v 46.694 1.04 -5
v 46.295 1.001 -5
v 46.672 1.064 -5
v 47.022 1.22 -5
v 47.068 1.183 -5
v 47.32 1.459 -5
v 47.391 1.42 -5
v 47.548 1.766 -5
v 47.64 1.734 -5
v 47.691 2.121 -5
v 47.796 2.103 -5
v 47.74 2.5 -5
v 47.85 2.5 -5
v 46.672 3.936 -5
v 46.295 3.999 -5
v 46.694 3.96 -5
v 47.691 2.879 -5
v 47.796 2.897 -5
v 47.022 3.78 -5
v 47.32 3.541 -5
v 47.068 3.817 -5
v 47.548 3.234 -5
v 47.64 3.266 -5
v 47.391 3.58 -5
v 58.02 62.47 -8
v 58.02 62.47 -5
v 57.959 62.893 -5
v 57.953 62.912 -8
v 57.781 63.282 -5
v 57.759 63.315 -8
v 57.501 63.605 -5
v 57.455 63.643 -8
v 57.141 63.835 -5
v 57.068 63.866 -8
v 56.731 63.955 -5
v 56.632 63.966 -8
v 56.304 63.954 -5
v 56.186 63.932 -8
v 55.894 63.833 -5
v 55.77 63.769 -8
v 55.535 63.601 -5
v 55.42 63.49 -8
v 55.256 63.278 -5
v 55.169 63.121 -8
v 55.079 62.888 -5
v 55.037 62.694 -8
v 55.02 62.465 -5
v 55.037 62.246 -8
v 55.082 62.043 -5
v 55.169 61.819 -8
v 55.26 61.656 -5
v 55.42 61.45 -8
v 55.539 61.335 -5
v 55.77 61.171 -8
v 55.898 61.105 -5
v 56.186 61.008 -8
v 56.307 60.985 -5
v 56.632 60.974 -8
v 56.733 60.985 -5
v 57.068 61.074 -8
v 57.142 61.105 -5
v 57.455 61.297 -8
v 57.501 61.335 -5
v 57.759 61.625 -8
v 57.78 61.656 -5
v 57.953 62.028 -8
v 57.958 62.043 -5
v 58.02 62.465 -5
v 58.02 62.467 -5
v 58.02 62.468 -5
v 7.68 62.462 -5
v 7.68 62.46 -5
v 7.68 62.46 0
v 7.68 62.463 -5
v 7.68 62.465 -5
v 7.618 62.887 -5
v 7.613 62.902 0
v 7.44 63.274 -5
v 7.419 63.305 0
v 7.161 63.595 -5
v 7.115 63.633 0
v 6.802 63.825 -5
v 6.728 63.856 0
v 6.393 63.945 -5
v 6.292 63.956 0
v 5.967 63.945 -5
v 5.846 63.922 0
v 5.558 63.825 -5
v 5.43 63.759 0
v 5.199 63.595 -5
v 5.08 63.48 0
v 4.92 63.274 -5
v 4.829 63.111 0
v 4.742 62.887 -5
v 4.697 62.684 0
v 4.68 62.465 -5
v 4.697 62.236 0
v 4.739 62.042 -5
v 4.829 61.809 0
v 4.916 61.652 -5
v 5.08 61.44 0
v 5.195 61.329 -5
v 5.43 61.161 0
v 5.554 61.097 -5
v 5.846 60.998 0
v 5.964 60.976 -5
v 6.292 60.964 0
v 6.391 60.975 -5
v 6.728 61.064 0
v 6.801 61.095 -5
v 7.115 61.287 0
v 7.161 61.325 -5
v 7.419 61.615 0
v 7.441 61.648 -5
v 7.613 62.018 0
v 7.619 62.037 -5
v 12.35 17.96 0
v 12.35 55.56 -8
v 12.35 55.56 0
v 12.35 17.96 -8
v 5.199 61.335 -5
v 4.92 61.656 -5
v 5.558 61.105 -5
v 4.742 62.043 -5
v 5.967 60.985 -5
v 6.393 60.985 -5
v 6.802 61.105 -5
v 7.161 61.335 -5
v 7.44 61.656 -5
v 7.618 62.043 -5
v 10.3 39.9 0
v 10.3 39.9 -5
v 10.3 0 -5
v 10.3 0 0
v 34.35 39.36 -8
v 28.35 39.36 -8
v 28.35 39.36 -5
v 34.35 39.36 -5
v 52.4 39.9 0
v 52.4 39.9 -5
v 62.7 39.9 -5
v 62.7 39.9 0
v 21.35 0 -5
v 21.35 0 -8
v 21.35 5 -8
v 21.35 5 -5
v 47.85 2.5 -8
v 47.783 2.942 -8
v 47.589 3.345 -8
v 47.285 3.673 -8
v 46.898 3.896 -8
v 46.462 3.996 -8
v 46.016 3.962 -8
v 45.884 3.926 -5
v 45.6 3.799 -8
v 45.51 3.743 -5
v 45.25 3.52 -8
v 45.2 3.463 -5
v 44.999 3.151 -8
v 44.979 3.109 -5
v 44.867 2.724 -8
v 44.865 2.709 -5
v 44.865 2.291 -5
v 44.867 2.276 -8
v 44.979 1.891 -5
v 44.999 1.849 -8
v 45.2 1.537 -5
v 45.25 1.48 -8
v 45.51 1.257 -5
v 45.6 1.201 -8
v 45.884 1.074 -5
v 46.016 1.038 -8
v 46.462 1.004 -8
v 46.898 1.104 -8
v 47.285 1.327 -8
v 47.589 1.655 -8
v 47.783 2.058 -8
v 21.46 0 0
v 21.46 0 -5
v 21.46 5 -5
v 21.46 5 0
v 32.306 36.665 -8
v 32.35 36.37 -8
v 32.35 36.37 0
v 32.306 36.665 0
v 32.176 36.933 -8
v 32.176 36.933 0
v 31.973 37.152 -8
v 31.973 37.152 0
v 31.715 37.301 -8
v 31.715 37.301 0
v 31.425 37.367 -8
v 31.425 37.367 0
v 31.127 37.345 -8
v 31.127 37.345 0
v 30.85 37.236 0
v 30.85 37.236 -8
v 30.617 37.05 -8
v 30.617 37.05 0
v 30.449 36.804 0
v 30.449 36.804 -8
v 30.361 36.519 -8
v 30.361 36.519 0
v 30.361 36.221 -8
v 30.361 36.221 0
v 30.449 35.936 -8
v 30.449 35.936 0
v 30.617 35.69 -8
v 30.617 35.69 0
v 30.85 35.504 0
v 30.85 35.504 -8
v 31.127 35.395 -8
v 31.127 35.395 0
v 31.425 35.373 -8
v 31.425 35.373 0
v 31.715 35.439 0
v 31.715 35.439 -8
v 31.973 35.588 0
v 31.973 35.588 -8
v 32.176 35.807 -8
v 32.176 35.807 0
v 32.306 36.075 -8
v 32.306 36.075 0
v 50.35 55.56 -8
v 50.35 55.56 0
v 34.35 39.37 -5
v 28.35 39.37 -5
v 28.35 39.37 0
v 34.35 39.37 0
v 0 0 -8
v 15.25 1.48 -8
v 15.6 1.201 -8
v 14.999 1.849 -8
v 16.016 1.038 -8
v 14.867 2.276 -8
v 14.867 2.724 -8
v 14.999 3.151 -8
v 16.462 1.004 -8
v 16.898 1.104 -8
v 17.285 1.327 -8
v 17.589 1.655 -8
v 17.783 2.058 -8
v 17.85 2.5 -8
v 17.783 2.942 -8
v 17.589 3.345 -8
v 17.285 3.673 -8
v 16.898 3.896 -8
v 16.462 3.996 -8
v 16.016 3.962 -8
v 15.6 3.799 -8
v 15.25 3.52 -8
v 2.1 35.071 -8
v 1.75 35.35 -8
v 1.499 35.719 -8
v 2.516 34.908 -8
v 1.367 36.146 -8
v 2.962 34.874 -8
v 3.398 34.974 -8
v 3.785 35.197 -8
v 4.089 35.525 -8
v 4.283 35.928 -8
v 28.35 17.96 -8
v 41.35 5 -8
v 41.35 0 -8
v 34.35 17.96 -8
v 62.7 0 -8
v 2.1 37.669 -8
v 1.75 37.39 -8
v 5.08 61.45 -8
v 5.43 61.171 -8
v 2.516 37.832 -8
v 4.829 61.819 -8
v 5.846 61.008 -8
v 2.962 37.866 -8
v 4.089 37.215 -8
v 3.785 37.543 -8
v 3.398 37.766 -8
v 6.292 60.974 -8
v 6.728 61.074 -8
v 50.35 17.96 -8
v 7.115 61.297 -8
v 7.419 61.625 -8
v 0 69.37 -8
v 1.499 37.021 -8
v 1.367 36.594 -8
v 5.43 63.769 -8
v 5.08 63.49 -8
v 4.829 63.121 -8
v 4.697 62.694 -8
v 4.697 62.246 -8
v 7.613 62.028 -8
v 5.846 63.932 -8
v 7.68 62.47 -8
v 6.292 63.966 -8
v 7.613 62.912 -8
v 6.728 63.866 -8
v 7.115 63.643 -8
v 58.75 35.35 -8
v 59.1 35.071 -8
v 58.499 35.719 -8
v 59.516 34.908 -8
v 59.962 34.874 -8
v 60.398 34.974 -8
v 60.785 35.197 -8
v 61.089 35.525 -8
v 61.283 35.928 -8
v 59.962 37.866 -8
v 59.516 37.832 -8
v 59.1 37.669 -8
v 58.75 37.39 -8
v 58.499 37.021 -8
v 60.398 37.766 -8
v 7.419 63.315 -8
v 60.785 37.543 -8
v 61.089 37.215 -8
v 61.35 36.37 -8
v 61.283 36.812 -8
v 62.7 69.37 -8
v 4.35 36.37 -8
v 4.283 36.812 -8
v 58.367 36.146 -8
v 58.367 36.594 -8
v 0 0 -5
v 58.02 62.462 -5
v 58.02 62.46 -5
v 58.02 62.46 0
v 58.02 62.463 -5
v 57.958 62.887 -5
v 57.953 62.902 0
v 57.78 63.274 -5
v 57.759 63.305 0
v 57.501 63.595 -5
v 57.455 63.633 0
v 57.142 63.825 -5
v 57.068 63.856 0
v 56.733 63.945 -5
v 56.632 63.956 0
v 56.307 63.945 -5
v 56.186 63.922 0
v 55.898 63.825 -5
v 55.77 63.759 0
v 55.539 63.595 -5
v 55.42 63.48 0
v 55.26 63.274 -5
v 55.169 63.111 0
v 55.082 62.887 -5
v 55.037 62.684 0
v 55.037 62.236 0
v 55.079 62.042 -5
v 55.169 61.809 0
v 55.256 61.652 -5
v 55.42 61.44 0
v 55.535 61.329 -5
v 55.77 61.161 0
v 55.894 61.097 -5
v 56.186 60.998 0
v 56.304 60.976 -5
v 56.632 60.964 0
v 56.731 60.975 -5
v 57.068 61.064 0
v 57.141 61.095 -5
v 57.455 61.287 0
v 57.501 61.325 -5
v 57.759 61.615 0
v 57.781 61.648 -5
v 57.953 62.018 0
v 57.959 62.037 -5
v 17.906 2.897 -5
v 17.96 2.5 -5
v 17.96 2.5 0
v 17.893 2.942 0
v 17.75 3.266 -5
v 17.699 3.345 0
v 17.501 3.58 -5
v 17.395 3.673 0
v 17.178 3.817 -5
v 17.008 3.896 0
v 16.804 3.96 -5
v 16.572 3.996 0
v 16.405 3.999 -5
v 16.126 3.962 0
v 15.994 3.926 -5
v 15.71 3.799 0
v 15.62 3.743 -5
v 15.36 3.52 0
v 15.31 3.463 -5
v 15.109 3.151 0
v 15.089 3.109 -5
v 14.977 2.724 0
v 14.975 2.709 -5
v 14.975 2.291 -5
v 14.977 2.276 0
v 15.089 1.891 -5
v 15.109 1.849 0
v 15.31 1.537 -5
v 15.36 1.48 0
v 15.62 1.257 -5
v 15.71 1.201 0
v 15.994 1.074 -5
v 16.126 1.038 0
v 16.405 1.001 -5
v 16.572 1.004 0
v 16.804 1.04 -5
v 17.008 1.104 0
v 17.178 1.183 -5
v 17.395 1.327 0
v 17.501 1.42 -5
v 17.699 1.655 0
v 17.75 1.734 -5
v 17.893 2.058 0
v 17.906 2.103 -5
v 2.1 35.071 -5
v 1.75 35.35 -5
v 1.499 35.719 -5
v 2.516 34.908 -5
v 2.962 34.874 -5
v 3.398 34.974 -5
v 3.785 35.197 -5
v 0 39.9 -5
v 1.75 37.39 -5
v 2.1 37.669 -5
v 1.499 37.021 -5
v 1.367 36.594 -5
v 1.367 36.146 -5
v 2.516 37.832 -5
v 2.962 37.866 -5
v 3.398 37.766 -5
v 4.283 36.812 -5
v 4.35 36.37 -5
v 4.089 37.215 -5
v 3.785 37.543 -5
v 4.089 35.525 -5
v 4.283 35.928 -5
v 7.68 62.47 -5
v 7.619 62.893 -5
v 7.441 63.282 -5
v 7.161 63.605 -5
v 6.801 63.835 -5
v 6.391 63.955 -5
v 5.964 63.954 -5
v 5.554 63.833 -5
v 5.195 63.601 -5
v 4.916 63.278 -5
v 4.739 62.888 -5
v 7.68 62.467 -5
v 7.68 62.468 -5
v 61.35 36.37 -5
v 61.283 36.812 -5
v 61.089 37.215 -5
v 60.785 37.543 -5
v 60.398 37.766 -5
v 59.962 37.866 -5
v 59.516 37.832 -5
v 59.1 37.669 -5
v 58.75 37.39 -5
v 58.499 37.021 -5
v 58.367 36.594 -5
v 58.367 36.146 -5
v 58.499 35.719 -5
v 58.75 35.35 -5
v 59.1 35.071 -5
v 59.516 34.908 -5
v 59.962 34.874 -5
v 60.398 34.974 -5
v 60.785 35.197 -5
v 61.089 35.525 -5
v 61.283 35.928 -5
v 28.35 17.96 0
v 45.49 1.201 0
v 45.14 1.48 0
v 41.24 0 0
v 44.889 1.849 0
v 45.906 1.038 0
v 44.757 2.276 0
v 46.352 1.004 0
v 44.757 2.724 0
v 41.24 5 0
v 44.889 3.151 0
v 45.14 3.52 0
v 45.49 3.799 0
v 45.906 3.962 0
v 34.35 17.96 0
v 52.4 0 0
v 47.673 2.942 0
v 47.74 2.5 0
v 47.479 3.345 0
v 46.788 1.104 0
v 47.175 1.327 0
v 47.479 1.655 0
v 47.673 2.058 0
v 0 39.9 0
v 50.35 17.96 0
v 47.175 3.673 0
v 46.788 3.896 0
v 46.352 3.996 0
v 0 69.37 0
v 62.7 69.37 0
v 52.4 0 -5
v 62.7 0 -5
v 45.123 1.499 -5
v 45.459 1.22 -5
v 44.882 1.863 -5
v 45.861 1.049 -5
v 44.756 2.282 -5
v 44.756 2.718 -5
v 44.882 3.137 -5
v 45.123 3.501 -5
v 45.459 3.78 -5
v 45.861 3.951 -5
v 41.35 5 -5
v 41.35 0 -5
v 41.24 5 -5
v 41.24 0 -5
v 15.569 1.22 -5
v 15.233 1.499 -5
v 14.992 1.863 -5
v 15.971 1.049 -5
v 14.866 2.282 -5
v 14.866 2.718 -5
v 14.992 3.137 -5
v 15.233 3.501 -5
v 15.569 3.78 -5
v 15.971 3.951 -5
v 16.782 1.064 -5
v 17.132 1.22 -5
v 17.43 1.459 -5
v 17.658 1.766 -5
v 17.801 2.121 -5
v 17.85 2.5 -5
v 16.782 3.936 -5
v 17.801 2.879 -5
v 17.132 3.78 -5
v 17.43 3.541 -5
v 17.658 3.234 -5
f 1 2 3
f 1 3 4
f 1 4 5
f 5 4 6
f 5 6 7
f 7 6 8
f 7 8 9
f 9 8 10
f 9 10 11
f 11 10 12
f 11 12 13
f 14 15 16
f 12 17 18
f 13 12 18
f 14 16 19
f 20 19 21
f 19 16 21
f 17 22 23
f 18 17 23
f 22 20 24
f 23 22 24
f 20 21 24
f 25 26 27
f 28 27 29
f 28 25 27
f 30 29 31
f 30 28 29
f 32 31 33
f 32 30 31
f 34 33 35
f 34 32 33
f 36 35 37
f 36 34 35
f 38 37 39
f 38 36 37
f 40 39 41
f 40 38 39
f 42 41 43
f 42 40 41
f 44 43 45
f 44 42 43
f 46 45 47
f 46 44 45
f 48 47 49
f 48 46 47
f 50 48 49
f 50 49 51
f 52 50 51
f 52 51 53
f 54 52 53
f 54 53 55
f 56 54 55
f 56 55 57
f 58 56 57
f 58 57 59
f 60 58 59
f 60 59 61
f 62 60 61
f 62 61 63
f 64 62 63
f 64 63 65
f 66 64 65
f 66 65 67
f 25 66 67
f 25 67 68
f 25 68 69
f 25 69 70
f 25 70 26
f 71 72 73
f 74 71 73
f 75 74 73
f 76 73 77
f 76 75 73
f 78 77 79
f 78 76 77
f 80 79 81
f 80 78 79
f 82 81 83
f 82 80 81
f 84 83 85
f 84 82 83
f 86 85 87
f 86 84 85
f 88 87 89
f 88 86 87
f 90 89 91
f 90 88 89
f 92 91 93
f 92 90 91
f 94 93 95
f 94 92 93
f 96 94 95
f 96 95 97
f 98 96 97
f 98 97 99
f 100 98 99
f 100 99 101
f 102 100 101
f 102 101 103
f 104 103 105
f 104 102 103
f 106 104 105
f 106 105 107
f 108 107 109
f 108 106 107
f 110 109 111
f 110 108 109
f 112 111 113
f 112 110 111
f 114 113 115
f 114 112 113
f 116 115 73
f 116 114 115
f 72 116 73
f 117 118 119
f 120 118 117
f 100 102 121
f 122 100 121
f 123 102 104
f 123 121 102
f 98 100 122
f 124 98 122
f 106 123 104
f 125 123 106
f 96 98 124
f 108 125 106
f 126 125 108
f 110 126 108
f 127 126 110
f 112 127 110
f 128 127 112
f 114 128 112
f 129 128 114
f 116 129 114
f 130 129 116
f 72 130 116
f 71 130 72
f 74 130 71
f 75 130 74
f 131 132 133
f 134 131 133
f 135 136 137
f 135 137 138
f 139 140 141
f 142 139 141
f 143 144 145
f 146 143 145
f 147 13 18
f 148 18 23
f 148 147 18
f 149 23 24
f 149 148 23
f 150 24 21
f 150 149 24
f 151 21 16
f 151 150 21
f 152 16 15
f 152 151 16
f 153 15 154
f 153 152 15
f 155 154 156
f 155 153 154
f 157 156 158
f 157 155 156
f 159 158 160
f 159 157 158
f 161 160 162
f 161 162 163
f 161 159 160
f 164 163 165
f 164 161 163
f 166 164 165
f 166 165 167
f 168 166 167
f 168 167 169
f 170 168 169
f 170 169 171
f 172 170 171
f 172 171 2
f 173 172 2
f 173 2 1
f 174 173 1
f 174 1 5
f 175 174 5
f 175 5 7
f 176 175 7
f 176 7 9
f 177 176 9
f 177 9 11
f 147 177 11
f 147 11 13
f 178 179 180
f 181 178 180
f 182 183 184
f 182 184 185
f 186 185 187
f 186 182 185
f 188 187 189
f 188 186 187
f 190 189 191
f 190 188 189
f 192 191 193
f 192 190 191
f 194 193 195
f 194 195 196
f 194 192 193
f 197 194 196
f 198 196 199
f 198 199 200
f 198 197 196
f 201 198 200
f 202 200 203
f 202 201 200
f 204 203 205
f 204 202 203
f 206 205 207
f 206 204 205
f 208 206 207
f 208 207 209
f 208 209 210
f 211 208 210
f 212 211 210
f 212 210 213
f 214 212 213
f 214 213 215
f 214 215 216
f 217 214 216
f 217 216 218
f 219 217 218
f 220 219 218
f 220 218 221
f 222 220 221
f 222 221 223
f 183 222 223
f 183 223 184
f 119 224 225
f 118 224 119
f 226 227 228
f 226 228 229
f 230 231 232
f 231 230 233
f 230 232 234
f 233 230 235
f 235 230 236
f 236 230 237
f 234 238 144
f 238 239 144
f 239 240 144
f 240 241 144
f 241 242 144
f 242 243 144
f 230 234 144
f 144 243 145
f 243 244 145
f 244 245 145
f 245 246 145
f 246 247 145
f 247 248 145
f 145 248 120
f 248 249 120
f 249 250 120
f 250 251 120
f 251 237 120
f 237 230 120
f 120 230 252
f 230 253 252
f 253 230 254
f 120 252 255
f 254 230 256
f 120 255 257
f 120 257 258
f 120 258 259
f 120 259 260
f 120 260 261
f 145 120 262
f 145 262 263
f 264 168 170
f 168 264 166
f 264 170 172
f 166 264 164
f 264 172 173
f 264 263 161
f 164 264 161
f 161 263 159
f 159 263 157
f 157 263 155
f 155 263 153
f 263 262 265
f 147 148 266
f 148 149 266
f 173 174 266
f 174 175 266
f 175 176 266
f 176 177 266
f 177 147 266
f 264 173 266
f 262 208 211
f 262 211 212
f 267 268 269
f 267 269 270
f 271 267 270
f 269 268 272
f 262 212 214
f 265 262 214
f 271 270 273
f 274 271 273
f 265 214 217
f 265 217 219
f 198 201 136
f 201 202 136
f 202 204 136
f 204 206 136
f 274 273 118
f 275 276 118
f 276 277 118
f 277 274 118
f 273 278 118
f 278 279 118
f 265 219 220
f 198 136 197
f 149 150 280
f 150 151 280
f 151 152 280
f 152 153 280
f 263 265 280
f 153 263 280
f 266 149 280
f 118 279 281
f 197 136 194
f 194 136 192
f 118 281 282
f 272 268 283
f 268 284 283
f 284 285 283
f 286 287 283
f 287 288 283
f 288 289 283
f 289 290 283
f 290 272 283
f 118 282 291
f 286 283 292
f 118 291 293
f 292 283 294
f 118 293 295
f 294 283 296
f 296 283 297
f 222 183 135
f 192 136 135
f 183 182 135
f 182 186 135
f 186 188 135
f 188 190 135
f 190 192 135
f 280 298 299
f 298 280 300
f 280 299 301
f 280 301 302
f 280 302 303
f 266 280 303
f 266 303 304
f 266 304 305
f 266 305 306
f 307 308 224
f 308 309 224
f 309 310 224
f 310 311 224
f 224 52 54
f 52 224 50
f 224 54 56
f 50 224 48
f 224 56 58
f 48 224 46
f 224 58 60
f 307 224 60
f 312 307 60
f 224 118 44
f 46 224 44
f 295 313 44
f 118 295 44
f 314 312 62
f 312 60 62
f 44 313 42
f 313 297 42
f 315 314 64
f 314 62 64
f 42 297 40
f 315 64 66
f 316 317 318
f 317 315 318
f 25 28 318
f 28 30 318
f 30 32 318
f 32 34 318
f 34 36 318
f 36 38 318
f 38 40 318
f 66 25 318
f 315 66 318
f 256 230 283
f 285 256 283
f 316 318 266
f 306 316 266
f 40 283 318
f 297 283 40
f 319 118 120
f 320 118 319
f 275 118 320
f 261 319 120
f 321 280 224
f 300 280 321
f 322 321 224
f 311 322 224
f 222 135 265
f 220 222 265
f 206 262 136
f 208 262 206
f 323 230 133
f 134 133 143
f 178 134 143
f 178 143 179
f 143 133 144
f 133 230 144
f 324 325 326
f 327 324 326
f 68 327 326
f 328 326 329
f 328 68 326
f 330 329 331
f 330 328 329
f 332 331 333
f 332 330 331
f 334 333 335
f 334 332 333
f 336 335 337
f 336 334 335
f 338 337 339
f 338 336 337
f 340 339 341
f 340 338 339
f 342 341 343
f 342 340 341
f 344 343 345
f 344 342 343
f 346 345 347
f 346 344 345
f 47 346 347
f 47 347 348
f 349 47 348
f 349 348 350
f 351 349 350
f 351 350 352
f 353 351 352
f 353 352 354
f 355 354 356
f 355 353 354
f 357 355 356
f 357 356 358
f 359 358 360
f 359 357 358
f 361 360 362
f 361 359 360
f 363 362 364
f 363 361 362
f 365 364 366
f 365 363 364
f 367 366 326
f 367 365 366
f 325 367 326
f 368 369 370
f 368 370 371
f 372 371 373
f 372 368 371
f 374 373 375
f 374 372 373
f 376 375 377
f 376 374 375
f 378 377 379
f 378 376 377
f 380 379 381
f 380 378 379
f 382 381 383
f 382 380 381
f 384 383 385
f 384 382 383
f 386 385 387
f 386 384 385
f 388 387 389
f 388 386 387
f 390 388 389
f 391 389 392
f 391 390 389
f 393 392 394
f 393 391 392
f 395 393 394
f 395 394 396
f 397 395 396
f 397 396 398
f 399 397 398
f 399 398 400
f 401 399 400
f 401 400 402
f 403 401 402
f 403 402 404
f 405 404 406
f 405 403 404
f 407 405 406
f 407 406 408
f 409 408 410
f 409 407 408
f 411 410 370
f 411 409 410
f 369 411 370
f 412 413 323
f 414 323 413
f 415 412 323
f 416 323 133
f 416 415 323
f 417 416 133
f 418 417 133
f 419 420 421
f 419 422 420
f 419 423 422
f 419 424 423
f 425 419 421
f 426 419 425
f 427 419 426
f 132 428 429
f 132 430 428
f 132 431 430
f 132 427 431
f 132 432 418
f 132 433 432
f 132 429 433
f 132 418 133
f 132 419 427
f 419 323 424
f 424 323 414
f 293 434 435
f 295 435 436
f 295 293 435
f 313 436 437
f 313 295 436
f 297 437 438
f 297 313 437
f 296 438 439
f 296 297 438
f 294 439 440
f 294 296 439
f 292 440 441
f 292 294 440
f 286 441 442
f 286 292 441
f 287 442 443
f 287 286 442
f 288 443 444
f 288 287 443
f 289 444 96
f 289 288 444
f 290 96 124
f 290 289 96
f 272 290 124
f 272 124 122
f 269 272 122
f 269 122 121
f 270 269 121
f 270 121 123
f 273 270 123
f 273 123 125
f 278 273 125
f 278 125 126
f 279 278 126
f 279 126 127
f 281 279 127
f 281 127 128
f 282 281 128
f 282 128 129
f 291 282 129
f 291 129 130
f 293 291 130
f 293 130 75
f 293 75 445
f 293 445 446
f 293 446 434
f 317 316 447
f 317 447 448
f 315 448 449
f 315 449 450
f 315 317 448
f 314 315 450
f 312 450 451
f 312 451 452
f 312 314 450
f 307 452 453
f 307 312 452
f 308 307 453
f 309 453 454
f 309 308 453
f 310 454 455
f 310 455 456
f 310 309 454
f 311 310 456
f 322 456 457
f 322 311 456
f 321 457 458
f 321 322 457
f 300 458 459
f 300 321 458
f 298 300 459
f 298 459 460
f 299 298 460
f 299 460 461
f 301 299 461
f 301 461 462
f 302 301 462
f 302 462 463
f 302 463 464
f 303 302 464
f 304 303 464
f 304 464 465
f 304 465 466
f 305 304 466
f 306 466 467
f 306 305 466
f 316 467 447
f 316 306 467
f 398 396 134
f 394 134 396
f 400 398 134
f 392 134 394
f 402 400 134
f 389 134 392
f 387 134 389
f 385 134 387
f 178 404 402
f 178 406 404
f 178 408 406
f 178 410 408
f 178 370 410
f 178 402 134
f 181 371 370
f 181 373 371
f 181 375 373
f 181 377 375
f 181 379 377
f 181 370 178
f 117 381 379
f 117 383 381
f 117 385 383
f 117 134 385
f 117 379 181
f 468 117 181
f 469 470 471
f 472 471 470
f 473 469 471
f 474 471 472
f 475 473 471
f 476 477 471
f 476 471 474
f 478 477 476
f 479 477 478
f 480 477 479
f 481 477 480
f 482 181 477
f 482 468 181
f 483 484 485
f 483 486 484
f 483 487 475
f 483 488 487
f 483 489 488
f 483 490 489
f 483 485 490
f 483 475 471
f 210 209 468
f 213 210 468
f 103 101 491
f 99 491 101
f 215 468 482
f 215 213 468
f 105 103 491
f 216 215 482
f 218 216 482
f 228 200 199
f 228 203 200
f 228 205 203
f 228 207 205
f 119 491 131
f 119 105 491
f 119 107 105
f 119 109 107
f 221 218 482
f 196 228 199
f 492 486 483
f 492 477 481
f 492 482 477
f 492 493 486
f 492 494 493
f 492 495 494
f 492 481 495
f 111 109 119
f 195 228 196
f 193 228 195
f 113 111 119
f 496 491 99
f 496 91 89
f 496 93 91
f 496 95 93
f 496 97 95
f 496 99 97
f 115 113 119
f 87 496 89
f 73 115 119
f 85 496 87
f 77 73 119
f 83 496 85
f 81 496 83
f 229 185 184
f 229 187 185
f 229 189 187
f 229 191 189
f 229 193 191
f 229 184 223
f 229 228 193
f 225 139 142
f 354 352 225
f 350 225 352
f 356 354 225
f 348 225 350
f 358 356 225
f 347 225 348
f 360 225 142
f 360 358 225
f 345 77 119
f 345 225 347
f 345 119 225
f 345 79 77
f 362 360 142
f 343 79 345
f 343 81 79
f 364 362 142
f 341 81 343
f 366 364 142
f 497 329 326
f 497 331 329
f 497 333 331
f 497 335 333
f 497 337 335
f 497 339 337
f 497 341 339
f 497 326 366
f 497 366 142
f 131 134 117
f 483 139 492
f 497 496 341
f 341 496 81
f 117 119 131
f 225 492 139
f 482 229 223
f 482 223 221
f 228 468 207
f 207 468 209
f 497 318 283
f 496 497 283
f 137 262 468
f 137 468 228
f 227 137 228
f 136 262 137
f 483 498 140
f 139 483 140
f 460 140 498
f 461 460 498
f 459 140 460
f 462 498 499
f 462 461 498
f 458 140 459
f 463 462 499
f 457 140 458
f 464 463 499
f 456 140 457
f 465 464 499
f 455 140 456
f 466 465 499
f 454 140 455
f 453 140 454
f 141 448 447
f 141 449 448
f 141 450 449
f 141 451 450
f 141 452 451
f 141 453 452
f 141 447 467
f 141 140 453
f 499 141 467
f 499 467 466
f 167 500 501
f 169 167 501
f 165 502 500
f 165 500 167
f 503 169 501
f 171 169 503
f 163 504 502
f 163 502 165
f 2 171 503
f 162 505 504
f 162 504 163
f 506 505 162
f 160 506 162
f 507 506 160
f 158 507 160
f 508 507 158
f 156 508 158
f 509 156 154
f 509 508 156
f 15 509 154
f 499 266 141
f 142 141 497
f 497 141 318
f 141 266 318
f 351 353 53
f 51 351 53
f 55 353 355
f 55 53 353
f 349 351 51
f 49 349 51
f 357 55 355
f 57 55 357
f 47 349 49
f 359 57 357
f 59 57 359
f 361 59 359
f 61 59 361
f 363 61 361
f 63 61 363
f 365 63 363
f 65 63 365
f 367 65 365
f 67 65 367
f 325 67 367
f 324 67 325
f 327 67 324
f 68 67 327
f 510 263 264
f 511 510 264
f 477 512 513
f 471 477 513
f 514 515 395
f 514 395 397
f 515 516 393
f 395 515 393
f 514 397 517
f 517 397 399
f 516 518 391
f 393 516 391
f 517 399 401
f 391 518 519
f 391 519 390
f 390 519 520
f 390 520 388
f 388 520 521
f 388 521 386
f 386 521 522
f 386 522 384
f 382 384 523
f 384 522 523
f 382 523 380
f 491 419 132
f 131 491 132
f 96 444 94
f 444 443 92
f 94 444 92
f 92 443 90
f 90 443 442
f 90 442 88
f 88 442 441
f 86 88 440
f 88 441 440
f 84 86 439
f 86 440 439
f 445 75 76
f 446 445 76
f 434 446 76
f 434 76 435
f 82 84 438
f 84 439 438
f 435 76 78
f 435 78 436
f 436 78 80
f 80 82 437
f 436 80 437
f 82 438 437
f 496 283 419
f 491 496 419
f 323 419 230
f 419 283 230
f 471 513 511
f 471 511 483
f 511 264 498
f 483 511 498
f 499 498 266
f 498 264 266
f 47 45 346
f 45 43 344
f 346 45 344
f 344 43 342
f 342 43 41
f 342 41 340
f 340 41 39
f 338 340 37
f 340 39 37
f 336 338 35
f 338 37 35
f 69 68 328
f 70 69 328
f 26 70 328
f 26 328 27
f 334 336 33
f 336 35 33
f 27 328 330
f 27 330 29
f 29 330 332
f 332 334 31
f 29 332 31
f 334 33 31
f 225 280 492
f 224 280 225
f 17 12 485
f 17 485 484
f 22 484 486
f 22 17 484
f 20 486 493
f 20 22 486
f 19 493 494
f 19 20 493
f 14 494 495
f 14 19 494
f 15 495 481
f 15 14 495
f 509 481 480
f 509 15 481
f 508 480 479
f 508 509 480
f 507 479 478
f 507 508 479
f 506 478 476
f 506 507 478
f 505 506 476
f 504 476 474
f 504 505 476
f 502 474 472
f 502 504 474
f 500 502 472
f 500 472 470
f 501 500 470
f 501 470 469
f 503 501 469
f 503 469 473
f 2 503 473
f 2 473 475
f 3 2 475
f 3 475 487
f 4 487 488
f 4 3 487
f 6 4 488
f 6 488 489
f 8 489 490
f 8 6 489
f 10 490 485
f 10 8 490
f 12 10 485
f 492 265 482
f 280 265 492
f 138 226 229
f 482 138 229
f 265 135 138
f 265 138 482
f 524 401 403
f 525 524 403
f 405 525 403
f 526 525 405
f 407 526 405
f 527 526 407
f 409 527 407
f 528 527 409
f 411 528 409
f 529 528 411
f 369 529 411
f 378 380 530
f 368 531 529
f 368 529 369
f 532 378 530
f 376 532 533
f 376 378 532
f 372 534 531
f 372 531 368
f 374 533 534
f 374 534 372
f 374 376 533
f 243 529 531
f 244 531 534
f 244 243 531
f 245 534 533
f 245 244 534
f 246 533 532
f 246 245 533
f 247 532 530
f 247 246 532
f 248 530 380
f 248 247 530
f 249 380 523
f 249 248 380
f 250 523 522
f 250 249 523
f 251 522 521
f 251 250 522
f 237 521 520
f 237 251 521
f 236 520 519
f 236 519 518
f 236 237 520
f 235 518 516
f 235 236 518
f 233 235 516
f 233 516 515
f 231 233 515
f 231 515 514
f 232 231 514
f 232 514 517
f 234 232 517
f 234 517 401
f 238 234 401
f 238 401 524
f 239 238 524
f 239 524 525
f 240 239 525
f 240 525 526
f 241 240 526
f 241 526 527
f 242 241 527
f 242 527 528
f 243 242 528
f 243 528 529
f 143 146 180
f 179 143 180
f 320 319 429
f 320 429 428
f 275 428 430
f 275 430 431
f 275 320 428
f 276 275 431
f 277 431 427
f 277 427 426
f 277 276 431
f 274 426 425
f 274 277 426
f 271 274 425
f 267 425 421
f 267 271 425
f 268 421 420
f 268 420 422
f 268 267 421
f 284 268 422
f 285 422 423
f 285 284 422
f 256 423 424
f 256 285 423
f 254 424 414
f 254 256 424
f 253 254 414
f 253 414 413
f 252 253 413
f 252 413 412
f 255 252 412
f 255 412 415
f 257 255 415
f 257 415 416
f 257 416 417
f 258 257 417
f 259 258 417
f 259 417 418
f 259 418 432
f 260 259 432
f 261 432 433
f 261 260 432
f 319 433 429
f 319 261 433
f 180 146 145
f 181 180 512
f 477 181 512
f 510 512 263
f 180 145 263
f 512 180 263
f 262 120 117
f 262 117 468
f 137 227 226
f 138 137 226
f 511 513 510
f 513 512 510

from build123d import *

# Parameters (mm, degrees)
SKETCH002_R   = 1.5
SKETCH002_R_2 = 1
PAD002_DEPTH  = 3
SKETCH001_R   = 1
SKETCH001_R_2 = 1.5
PAD001_DEPTH  = 5


with BuildPart() as platte3:
    # Sketch002 → Pad002 (new body)
    with BuildSketch(Plane.XY):
        Polygon((-31.35, 69.37), (-31.35, 0), (-10, 0), (-10, 5), (10, 5), (10, 0), (31.35, 0), (31.35, 69.37), align=None)
        with Locations((-25.17, 62.47)):
            Circle(SKETCH002_R, mode=Mode.SUBTRACT)
        with Locations((25.17, 62.47)):
            Circle(SKETCH002_R, mode=Mode.SUBTRACT)
        with Locations((-28.5, 36.37)):
            Circle(SKETCH002_R, mode=Mode.SUBTRACT)
        with Locations((28.5, 36.37)):
            Circle(SKETCH002_R, mode=Mode.SUBTRACT)
        with Locations((-15, 2.5)):
            Circle(SKETCH002_R, mode=Mode.SUBTRACT)
        with Locations((15, 2.5)):
            Circle(SKETCH002_R, mode=Mode.SUBTRACT)
        with Locations((0, 36.37)):
            Circle(SKETCH002_R_2, mode=Mode.SUBTRACT)
        Polygon((-19, 55.56), (-19, 17.96), (-3, 17.96), (-3, 39.36), (3, 39.36), (3, 17.96), (19, 17.96), (19, 55.56), align=None, mode=Mode.SUBTRACT)
    extrude(amount=PAD002_DEPTH)


with BuildPart() as base_fusion:
    # Sketch001 → Pad001 (new body)
    with BuildSketch(Plane.XY):
        Polygon((-31.35, 69.37), (-31.35, 39.9), (-21.05, 39.9), (-21.05, 0), (-9.89, 0), (-9.89, 5), (9.89, 5), (9.89, 0), (21.05, 0), (21.05, 39.9), (31.35, 39.9), (31.35, 69.37), align=None)
        with Locations((0, 36.37)):
            Circle(SKETCH001_R, mode=Mode.SUBTRACT)
        with Locations((-14.89, 2.5)):
            Circle(SKETCH001_R_2, mode=Mode.SUBTRACT)
        with Locations((14.89, 2.5)):
            Circle(SKETCH001_R_2, mode=Mode.SUBTRACT)
        with Locations((-25.17, 62.46)):
            Circle(SKETCH001_R_2, mode=Mode.SUBTRACT)
        with Locations((25.17, 62.46)):
            Circle(SKETCH001_R_2, mode=Mode.SUBTRACT)
        Polygon((-19, 55.56), (-19, 17.96), (-3, 17.96), (-3, 39.37), (3, 39.37), (3, 17.96), (19, 17.96), (19, 55.56), align=None, mode=Mode.SUBTRACT)
    extrude(amount=PAD001_DEPTH)


with BuildPart() as base_fusion_1:
    # Body001 placement: moved
    add(base_fusion.part.moved(Location((0, 0, 3))))

    # Fusion: union platte3
    add(platte3.part)


with BuildPart() as base_fusion_2:
    # Clone placement: moved
    add(base_fusion_1.part.moved(Location((31.35, 0, -8))))


solid = base_fusion_2.part
